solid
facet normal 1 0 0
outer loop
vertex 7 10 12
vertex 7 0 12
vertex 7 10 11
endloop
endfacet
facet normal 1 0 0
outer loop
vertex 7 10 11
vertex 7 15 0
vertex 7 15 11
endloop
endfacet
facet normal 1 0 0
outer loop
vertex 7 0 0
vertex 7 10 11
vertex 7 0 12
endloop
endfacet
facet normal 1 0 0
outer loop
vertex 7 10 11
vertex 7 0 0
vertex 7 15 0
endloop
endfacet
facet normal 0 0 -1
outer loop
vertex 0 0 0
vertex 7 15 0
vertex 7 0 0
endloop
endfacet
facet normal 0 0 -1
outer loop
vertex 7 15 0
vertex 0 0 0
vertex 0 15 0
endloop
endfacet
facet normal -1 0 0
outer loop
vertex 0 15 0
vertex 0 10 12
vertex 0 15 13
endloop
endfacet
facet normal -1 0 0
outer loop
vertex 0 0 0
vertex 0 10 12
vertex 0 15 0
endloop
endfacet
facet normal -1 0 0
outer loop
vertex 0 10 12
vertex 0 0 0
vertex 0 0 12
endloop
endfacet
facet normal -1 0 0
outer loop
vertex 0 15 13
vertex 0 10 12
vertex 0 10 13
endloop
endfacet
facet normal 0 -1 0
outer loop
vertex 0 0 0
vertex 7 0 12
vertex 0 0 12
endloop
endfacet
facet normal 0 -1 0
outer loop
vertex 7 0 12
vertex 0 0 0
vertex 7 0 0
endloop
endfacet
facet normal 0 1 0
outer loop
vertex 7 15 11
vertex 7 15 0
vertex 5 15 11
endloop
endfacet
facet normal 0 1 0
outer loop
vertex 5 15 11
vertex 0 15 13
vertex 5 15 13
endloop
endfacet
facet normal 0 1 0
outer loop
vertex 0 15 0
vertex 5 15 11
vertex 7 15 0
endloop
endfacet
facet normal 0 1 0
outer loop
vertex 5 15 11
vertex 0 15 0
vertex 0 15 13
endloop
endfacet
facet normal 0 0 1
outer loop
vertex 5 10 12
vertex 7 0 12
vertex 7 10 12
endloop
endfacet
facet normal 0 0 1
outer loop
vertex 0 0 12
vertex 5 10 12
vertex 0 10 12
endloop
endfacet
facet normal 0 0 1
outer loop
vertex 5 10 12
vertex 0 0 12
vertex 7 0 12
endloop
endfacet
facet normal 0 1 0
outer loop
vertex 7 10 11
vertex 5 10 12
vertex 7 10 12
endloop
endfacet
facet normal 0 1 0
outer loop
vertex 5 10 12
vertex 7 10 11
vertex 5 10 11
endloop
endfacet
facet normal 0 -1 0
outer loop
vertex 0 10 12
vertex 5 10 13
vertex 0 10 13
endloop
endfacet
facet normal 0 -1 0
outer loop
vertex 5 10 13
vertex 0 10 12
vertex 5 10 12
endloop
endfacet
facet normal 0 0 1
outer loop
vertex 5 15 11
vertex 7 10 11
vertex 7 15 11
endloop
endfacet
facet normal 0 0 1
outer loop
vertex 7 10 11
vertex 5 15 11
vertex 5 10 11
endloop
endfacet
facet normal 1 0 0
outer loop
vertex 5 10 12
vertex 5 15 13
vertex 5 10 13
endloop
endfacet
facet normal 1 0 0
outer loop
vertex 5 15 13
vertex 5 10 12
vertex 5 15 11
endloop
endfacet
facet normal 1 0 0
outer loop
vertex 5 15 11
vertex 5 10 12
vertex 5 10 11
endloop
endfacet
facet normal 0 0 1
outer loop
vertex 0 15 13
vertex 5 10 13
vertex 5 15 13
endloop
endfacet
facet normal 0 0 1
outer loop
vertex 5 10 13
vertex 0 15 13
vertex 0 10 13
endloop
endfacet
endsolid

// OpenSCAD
translate([3.5, 2.5, 1.5]) color([0.5442354114772292, 0.620599970977755, 0.8359026555711022]) cube([7, 5, 3], center=true);
translate([3.5, 7.5, 1.5]) color([0.07000430092833387, 0.07197168951426236, 0.3010615360013691]) cube([7, 5, 3], center=true);
translate([3.5, 12.5, 1.5]) color([0.43606864795325617, 0.06104243921962749, 0.46713122754826175]) cube([7, 5, 3], center=true);
translate([3.5, 2.5, 4.5]) color([0.5964849226245376, 0.6993231250959273, 0.39127619713064865]) cube([7, 5, 3], center=true);
translate([3.5, 7.5, 4.5]) color([0.2601332542192585, 0.9043986330300443, 0.47021616129820465]) cube([7, 5, 3], center=true);
translate([3.5, 12.5, 4.5]) color([0.9023042315131579, 0.5697685418235108, 0.6976970707821888]) cube([7, 5, 3], center=true);
translate([3.5, 2.5, 7.5]) color([0.2034146857749588, 0.7673483420763234, 0.7886482900098098]) cube([7, 5, 3], center=true);
translate([3.5, 7.5, 7.5]) color([0.1582086298273846, 0.16195407019788421, 0.5294742230377147]) cube([7, 5, 3], center=true);
translate([3.5, 12.5, 7.5]) color([0.11721284387105246, 0.9214183944636138, 0.6656058220179341]) cube([7, 5, 3], center=true);
translate([3.5, 2.5, 10.5]) color([0.01320375853497835, 0.6812806756042346, 0.9000980523907597]) cube([7, 5, 3], center=true);
translate([3.5, 7.5, 10.5]) color([0.8748046942695984, 0.9175111227590292, 0.6489334878113245]) cube([7, 5, 3], center=true);
translate([2.5, 11.5, 10.0]) color([0.38864224283144744, 0.6576161999324908, 0.15341277093142425]) cube([5, 3, 2], center=true);
translate([2.5, 14.0, 10.0]) color([0.6908227578732097, 0.4579542036471842, 0.07907378923830799]) cube([5, 2, 2], center=true);
translate([6.0, 11.5, 10.0]) color([0.7390161160059011, 0.5443194976514814, 0.13483760684825774]) cube([2, 3, 2], center=true);
translate([6.0, 14.0, 10.0]) color([0.7621666562045316, 0.4818270828740713, 0.6101356542697393]) cube([2, 2, 2], center=true);
translate([2.5, 11.5, 12.0]) color([0.673403459483394, 0.5902776863195436, 0.8919435414206076]) cube([5, 3, 2], center=true);
translate([2.5, 14.0, 12.0]) color([0.8537743808409336, 0.1323442810447465, 0.3102975814641805]) cube([5, 2, 2], center=true);
